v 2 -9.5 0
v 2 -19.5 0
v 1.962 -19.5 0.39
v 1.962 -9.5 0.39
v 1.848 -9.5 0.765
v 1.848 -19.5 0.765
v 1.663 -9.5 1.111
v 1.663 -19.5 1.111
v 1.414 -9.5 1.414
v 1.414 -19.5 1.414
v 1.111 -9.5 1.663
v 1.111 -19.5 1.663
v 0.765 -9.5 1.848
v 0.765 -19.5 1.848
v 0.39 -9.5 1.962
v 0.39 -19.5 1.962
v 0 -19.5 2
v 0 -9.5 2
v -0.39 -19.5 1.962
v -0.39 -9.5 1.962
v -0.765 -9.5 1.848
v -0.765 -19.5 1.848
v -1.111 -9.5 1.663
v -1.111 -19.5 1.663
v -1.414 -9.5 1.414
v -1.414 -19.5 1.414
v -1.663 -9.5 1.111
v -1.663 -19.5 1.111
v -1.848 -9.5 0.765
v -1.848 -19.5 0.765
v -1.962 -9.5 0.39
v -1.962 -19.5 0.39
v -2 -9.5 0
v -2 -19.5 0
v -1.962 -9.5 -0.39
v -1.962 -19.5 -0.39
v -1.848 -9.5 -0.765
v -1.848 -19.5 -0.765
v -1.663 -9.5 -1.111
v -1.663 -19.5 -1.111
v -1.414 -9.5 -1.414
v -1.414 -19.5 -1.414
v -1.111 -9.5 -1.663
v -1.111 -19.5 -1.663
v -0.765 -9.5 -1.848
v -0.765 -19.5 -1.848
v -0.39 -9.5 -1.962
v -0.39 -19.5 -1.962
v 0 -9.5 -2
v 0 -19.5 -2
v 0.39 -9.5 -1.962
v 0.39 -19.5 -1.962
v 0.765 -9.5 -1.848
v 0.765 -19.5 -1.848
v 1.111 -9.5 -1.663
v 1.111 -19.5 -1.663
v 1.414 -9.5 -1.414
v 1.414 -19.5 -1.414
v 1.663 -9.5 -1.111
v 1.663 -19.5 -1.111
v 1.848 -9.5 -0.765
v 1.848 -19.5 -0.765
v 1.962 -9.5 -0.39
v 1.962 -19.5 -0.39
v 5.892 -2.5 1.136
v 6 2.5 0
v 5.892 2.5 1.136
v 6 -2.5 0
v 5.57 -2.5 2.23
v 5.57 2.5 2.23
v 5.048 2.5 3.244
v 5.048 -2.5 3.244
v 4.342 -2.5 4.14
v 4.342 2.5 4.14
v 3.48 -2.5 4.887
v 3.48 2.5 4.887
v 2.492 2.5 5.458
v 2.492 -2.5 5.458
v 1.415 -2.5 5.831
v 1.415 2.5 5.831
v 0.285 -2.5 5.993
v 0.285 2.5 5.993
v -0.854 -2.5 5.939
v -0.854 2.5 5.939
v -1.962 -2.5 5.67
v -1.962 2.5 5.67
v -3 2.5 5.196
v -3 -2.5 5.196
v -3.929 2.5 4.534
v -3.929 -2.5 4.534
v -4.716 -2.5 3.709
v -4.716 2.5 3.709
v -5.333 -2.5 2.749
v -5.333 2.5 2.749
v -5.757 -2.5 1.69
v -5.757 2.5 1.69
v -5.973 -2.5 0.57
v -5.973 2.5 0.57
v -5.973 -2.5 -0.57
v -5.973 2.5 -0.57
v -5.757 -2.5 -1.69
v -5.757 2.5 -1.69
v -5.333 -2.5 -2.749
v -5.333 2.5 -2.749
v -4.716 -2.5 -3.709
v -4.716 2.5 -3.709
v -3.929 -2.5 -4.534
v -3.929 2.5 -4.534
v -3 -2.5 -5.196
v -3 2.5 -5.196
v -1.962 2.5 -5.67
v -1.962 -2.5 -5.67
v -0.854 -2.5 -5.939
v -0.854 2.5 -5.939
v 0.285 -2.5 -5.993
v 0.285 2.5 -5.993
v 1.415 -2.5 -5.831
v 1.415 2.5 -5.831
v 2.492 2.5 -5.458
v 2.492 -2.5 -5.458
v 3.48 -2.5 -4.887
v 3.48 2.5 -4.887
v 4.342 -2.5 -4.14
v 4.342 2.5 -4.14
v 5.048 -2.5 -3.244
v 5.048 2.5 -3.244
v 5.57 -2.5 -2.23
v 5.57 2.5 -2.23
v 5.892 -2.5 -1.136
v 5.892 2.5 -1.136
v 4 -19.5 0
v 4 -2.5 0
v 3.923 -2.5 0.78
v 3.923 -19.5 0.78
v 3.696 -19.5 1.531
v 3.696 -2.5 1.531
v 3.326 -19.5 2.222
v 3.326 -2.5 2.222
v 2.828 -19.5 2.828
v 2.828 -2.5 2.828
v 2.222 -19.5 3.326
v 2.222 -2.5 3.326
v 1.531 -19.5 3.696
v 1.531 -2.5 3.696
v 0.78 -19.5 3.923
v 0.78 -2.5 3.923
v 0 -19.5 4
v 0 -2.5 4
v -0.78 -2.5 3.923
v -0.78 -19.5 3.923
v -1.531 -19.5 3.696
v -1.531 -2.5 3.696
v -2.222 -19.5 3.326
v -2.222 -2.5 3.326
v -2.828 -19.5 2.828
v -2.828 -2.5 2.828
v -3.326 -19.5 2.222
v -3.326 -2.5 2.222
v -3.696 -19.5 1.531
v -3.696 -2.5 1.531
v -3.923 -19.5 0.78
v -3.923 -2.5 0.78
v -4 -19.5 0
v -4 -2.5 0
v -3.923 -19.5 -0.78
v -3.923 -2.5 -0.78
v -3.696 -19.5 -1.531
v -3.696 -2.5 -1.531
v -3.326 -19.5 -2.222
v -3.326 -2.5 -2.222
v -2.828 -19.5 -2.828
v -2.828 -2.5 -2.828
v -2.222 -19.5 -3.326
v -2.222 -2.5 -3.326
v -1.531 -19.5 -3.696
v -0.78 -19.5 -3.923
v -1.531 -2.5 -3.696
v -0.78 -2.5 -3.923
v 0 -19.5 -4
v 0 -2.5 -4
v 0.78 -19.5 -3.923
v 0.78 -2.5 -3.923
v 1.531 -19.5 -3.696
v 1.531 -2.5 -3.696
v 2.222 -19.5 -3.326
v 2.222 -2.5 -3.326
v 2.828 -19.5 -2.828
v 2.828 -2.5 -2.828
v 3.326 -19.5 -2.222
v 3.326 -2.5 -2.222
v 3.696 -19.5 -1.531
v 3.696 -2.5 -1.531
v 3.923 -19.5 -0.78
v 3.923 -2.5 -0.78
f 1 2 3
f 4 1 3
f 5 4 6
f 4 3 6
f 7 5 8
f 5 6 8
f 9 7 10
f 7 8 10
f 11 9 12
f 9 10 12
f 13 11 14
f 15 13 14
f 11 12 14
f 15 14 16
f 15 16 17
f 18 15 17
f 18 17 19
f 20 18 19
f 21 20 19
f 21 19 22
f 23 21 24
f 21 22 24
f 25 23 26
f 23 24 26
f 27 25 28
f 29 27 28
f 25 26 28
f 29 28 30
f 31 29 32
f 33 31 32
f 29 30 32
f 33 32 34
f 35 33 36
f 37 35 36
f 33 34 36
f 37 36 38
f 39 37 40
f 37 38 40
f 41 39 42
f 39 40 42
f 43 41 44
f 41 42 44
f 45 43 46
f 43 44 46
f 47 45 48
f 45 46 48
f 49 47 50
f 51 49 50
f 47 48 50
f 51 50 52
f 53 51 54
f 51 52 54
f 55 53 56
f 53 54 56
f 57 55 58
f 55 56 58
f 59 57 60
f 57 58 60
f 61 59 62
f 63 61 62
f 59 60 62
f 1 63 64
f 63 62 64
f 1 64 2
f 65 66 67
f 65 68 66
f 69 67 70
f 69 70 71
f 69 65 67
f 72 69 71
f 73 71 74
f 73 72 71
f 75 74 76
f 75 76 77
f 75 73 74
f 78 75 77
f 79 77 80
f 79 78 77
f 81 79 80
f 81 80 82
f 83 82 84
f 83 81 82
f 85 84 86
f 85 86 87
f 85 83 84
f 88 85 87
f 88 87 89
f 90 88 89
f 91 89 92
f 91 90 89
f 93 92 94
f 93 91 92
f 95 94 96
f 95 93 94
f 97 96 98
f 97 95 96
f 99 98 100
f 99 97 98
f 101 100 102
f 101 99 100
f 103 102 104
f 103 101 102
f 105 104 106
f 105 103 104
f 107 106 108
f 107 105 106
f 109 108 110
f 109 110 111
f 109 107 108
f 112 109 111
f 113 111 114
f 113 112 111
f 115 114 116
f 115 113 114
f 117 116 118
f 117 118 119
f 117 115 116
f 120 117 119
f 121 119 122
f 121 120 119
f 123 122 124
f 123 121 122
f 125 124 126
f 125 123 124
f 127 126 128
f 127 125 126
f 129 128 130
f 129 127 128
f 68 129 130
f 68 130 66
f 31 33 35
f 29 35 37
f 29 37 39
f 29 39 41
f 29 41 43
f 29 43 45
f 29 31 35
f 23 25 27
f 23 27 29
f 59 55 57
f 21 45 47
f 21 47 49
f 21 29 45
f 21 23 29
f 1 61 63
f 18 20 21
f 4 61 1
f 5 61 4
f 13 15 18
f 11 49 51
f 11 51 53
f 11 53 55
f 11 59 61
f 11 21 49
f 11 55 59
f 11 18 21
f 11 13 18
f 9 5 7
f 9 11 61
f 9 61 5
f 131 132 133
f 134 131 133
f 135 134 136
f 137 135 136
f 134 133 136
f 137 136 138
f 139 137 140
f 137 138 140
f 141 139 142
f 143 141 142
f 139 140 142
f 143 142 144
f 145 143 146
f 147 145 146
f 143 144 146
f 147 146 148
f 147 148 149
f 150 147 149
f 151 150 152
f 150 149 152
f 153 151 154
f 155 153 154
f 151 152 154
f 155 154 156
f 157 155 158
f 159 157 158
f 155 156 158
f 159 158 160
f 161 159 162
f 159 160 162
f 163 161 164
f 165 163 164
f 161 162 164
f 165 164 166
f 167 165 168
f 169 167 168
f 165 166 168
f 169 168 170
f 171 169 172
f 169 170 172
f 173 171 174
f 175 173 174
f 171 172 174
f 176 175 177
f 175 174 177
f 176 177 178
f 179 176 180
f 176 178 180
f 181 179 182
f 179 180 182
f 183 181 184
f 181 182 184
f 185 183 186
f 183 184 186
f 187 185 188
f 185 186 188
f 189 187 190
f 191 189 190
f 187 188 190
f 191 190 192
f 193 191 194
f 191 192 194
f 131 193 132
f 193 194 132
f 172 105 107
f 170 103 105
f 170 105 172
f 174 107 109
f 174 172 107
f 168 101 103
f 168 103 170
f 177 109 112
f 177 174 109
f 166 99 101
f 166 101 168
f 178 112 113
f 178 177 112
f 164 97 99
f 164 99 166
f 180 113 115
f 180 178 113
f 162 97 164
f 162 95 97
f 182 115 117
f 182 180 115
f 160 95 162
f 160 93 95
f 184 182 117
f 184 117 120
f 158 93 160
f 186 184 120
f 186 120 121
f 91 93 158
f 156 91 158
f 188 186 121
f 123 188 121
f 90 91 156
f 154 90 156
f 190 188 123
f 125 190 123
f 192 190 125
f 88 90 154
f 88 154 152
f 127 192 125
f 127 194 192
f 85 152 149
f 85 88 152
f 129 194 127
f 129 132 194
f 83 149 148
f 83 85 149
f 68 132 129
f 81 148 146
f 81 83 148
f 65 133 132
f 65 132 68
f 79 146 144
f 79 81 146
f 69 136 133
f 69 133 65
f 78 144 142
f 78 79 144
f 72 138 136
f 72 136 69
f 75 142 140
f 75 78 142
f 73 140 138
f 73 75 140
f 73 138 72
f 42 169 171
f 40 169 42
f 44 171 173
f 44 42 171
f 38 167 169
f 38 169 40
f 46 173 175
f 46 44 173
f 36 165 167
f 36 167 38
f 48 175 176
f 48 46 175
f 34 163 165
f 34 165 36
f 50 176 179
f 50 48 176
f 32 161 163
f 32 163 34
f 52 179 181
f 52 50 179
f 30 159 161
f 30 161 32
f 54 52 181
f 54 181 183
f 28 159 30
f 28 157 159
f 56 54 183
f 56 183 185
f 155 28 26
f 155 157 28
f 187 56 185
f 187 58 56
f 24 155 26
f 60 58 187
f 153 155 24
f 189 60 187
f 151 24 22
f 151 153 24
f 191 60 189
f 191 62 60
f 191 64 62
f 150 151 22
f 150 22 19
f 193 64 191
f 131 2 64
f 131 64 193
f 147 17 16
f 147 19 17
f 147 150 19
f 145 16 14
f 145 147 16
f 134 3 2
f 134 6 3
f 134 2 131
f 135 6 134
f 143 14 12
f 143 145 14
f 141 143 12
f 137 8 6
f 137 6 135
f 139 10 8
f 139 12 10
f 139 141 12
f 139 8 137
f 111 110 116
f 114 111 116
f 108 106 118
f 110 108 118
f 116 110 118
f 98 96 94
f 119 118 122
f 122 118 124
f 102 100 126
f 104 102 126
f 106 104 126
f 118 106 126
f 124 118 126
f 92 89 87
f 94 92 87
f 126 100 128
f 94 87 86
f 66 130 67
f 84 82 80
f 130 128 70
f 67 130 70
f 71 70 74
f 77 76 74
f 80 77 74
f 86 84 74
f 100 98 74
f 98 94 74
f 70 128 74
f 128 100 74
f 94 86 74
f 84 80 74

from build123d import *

# Parameters (mm, degrees)
F0_R     = 6
F1_DEPTH = 2.5
F2_R     = 4
F3_DEPTH = 17
F4_R     = 2
F5_DEPTH = 10


with BuildPart() as f1:
    # F0 (on Front) → F1 (new body, symmetric)
    with BuildSketch(Plane.XZ):
        Circle(F0_R)
    extrude(amount=F1_DEPTH, both=True)

    # F2 (on face) → F3 (join)
    with BuildSketch(Plane.XZ.offset(2.5)):
        Circle(F2_R)
    extrude(amount=F3_DEPTH)

    # F4 (on face) → F5 (cut)
    with BuildSketch(Plane.XZ.offset(19.5)):
        Circle(F4_R)
    extrude(amount=-F5_DEPTH, mode=Mode.SUBTRACT)


solid = f1.part
